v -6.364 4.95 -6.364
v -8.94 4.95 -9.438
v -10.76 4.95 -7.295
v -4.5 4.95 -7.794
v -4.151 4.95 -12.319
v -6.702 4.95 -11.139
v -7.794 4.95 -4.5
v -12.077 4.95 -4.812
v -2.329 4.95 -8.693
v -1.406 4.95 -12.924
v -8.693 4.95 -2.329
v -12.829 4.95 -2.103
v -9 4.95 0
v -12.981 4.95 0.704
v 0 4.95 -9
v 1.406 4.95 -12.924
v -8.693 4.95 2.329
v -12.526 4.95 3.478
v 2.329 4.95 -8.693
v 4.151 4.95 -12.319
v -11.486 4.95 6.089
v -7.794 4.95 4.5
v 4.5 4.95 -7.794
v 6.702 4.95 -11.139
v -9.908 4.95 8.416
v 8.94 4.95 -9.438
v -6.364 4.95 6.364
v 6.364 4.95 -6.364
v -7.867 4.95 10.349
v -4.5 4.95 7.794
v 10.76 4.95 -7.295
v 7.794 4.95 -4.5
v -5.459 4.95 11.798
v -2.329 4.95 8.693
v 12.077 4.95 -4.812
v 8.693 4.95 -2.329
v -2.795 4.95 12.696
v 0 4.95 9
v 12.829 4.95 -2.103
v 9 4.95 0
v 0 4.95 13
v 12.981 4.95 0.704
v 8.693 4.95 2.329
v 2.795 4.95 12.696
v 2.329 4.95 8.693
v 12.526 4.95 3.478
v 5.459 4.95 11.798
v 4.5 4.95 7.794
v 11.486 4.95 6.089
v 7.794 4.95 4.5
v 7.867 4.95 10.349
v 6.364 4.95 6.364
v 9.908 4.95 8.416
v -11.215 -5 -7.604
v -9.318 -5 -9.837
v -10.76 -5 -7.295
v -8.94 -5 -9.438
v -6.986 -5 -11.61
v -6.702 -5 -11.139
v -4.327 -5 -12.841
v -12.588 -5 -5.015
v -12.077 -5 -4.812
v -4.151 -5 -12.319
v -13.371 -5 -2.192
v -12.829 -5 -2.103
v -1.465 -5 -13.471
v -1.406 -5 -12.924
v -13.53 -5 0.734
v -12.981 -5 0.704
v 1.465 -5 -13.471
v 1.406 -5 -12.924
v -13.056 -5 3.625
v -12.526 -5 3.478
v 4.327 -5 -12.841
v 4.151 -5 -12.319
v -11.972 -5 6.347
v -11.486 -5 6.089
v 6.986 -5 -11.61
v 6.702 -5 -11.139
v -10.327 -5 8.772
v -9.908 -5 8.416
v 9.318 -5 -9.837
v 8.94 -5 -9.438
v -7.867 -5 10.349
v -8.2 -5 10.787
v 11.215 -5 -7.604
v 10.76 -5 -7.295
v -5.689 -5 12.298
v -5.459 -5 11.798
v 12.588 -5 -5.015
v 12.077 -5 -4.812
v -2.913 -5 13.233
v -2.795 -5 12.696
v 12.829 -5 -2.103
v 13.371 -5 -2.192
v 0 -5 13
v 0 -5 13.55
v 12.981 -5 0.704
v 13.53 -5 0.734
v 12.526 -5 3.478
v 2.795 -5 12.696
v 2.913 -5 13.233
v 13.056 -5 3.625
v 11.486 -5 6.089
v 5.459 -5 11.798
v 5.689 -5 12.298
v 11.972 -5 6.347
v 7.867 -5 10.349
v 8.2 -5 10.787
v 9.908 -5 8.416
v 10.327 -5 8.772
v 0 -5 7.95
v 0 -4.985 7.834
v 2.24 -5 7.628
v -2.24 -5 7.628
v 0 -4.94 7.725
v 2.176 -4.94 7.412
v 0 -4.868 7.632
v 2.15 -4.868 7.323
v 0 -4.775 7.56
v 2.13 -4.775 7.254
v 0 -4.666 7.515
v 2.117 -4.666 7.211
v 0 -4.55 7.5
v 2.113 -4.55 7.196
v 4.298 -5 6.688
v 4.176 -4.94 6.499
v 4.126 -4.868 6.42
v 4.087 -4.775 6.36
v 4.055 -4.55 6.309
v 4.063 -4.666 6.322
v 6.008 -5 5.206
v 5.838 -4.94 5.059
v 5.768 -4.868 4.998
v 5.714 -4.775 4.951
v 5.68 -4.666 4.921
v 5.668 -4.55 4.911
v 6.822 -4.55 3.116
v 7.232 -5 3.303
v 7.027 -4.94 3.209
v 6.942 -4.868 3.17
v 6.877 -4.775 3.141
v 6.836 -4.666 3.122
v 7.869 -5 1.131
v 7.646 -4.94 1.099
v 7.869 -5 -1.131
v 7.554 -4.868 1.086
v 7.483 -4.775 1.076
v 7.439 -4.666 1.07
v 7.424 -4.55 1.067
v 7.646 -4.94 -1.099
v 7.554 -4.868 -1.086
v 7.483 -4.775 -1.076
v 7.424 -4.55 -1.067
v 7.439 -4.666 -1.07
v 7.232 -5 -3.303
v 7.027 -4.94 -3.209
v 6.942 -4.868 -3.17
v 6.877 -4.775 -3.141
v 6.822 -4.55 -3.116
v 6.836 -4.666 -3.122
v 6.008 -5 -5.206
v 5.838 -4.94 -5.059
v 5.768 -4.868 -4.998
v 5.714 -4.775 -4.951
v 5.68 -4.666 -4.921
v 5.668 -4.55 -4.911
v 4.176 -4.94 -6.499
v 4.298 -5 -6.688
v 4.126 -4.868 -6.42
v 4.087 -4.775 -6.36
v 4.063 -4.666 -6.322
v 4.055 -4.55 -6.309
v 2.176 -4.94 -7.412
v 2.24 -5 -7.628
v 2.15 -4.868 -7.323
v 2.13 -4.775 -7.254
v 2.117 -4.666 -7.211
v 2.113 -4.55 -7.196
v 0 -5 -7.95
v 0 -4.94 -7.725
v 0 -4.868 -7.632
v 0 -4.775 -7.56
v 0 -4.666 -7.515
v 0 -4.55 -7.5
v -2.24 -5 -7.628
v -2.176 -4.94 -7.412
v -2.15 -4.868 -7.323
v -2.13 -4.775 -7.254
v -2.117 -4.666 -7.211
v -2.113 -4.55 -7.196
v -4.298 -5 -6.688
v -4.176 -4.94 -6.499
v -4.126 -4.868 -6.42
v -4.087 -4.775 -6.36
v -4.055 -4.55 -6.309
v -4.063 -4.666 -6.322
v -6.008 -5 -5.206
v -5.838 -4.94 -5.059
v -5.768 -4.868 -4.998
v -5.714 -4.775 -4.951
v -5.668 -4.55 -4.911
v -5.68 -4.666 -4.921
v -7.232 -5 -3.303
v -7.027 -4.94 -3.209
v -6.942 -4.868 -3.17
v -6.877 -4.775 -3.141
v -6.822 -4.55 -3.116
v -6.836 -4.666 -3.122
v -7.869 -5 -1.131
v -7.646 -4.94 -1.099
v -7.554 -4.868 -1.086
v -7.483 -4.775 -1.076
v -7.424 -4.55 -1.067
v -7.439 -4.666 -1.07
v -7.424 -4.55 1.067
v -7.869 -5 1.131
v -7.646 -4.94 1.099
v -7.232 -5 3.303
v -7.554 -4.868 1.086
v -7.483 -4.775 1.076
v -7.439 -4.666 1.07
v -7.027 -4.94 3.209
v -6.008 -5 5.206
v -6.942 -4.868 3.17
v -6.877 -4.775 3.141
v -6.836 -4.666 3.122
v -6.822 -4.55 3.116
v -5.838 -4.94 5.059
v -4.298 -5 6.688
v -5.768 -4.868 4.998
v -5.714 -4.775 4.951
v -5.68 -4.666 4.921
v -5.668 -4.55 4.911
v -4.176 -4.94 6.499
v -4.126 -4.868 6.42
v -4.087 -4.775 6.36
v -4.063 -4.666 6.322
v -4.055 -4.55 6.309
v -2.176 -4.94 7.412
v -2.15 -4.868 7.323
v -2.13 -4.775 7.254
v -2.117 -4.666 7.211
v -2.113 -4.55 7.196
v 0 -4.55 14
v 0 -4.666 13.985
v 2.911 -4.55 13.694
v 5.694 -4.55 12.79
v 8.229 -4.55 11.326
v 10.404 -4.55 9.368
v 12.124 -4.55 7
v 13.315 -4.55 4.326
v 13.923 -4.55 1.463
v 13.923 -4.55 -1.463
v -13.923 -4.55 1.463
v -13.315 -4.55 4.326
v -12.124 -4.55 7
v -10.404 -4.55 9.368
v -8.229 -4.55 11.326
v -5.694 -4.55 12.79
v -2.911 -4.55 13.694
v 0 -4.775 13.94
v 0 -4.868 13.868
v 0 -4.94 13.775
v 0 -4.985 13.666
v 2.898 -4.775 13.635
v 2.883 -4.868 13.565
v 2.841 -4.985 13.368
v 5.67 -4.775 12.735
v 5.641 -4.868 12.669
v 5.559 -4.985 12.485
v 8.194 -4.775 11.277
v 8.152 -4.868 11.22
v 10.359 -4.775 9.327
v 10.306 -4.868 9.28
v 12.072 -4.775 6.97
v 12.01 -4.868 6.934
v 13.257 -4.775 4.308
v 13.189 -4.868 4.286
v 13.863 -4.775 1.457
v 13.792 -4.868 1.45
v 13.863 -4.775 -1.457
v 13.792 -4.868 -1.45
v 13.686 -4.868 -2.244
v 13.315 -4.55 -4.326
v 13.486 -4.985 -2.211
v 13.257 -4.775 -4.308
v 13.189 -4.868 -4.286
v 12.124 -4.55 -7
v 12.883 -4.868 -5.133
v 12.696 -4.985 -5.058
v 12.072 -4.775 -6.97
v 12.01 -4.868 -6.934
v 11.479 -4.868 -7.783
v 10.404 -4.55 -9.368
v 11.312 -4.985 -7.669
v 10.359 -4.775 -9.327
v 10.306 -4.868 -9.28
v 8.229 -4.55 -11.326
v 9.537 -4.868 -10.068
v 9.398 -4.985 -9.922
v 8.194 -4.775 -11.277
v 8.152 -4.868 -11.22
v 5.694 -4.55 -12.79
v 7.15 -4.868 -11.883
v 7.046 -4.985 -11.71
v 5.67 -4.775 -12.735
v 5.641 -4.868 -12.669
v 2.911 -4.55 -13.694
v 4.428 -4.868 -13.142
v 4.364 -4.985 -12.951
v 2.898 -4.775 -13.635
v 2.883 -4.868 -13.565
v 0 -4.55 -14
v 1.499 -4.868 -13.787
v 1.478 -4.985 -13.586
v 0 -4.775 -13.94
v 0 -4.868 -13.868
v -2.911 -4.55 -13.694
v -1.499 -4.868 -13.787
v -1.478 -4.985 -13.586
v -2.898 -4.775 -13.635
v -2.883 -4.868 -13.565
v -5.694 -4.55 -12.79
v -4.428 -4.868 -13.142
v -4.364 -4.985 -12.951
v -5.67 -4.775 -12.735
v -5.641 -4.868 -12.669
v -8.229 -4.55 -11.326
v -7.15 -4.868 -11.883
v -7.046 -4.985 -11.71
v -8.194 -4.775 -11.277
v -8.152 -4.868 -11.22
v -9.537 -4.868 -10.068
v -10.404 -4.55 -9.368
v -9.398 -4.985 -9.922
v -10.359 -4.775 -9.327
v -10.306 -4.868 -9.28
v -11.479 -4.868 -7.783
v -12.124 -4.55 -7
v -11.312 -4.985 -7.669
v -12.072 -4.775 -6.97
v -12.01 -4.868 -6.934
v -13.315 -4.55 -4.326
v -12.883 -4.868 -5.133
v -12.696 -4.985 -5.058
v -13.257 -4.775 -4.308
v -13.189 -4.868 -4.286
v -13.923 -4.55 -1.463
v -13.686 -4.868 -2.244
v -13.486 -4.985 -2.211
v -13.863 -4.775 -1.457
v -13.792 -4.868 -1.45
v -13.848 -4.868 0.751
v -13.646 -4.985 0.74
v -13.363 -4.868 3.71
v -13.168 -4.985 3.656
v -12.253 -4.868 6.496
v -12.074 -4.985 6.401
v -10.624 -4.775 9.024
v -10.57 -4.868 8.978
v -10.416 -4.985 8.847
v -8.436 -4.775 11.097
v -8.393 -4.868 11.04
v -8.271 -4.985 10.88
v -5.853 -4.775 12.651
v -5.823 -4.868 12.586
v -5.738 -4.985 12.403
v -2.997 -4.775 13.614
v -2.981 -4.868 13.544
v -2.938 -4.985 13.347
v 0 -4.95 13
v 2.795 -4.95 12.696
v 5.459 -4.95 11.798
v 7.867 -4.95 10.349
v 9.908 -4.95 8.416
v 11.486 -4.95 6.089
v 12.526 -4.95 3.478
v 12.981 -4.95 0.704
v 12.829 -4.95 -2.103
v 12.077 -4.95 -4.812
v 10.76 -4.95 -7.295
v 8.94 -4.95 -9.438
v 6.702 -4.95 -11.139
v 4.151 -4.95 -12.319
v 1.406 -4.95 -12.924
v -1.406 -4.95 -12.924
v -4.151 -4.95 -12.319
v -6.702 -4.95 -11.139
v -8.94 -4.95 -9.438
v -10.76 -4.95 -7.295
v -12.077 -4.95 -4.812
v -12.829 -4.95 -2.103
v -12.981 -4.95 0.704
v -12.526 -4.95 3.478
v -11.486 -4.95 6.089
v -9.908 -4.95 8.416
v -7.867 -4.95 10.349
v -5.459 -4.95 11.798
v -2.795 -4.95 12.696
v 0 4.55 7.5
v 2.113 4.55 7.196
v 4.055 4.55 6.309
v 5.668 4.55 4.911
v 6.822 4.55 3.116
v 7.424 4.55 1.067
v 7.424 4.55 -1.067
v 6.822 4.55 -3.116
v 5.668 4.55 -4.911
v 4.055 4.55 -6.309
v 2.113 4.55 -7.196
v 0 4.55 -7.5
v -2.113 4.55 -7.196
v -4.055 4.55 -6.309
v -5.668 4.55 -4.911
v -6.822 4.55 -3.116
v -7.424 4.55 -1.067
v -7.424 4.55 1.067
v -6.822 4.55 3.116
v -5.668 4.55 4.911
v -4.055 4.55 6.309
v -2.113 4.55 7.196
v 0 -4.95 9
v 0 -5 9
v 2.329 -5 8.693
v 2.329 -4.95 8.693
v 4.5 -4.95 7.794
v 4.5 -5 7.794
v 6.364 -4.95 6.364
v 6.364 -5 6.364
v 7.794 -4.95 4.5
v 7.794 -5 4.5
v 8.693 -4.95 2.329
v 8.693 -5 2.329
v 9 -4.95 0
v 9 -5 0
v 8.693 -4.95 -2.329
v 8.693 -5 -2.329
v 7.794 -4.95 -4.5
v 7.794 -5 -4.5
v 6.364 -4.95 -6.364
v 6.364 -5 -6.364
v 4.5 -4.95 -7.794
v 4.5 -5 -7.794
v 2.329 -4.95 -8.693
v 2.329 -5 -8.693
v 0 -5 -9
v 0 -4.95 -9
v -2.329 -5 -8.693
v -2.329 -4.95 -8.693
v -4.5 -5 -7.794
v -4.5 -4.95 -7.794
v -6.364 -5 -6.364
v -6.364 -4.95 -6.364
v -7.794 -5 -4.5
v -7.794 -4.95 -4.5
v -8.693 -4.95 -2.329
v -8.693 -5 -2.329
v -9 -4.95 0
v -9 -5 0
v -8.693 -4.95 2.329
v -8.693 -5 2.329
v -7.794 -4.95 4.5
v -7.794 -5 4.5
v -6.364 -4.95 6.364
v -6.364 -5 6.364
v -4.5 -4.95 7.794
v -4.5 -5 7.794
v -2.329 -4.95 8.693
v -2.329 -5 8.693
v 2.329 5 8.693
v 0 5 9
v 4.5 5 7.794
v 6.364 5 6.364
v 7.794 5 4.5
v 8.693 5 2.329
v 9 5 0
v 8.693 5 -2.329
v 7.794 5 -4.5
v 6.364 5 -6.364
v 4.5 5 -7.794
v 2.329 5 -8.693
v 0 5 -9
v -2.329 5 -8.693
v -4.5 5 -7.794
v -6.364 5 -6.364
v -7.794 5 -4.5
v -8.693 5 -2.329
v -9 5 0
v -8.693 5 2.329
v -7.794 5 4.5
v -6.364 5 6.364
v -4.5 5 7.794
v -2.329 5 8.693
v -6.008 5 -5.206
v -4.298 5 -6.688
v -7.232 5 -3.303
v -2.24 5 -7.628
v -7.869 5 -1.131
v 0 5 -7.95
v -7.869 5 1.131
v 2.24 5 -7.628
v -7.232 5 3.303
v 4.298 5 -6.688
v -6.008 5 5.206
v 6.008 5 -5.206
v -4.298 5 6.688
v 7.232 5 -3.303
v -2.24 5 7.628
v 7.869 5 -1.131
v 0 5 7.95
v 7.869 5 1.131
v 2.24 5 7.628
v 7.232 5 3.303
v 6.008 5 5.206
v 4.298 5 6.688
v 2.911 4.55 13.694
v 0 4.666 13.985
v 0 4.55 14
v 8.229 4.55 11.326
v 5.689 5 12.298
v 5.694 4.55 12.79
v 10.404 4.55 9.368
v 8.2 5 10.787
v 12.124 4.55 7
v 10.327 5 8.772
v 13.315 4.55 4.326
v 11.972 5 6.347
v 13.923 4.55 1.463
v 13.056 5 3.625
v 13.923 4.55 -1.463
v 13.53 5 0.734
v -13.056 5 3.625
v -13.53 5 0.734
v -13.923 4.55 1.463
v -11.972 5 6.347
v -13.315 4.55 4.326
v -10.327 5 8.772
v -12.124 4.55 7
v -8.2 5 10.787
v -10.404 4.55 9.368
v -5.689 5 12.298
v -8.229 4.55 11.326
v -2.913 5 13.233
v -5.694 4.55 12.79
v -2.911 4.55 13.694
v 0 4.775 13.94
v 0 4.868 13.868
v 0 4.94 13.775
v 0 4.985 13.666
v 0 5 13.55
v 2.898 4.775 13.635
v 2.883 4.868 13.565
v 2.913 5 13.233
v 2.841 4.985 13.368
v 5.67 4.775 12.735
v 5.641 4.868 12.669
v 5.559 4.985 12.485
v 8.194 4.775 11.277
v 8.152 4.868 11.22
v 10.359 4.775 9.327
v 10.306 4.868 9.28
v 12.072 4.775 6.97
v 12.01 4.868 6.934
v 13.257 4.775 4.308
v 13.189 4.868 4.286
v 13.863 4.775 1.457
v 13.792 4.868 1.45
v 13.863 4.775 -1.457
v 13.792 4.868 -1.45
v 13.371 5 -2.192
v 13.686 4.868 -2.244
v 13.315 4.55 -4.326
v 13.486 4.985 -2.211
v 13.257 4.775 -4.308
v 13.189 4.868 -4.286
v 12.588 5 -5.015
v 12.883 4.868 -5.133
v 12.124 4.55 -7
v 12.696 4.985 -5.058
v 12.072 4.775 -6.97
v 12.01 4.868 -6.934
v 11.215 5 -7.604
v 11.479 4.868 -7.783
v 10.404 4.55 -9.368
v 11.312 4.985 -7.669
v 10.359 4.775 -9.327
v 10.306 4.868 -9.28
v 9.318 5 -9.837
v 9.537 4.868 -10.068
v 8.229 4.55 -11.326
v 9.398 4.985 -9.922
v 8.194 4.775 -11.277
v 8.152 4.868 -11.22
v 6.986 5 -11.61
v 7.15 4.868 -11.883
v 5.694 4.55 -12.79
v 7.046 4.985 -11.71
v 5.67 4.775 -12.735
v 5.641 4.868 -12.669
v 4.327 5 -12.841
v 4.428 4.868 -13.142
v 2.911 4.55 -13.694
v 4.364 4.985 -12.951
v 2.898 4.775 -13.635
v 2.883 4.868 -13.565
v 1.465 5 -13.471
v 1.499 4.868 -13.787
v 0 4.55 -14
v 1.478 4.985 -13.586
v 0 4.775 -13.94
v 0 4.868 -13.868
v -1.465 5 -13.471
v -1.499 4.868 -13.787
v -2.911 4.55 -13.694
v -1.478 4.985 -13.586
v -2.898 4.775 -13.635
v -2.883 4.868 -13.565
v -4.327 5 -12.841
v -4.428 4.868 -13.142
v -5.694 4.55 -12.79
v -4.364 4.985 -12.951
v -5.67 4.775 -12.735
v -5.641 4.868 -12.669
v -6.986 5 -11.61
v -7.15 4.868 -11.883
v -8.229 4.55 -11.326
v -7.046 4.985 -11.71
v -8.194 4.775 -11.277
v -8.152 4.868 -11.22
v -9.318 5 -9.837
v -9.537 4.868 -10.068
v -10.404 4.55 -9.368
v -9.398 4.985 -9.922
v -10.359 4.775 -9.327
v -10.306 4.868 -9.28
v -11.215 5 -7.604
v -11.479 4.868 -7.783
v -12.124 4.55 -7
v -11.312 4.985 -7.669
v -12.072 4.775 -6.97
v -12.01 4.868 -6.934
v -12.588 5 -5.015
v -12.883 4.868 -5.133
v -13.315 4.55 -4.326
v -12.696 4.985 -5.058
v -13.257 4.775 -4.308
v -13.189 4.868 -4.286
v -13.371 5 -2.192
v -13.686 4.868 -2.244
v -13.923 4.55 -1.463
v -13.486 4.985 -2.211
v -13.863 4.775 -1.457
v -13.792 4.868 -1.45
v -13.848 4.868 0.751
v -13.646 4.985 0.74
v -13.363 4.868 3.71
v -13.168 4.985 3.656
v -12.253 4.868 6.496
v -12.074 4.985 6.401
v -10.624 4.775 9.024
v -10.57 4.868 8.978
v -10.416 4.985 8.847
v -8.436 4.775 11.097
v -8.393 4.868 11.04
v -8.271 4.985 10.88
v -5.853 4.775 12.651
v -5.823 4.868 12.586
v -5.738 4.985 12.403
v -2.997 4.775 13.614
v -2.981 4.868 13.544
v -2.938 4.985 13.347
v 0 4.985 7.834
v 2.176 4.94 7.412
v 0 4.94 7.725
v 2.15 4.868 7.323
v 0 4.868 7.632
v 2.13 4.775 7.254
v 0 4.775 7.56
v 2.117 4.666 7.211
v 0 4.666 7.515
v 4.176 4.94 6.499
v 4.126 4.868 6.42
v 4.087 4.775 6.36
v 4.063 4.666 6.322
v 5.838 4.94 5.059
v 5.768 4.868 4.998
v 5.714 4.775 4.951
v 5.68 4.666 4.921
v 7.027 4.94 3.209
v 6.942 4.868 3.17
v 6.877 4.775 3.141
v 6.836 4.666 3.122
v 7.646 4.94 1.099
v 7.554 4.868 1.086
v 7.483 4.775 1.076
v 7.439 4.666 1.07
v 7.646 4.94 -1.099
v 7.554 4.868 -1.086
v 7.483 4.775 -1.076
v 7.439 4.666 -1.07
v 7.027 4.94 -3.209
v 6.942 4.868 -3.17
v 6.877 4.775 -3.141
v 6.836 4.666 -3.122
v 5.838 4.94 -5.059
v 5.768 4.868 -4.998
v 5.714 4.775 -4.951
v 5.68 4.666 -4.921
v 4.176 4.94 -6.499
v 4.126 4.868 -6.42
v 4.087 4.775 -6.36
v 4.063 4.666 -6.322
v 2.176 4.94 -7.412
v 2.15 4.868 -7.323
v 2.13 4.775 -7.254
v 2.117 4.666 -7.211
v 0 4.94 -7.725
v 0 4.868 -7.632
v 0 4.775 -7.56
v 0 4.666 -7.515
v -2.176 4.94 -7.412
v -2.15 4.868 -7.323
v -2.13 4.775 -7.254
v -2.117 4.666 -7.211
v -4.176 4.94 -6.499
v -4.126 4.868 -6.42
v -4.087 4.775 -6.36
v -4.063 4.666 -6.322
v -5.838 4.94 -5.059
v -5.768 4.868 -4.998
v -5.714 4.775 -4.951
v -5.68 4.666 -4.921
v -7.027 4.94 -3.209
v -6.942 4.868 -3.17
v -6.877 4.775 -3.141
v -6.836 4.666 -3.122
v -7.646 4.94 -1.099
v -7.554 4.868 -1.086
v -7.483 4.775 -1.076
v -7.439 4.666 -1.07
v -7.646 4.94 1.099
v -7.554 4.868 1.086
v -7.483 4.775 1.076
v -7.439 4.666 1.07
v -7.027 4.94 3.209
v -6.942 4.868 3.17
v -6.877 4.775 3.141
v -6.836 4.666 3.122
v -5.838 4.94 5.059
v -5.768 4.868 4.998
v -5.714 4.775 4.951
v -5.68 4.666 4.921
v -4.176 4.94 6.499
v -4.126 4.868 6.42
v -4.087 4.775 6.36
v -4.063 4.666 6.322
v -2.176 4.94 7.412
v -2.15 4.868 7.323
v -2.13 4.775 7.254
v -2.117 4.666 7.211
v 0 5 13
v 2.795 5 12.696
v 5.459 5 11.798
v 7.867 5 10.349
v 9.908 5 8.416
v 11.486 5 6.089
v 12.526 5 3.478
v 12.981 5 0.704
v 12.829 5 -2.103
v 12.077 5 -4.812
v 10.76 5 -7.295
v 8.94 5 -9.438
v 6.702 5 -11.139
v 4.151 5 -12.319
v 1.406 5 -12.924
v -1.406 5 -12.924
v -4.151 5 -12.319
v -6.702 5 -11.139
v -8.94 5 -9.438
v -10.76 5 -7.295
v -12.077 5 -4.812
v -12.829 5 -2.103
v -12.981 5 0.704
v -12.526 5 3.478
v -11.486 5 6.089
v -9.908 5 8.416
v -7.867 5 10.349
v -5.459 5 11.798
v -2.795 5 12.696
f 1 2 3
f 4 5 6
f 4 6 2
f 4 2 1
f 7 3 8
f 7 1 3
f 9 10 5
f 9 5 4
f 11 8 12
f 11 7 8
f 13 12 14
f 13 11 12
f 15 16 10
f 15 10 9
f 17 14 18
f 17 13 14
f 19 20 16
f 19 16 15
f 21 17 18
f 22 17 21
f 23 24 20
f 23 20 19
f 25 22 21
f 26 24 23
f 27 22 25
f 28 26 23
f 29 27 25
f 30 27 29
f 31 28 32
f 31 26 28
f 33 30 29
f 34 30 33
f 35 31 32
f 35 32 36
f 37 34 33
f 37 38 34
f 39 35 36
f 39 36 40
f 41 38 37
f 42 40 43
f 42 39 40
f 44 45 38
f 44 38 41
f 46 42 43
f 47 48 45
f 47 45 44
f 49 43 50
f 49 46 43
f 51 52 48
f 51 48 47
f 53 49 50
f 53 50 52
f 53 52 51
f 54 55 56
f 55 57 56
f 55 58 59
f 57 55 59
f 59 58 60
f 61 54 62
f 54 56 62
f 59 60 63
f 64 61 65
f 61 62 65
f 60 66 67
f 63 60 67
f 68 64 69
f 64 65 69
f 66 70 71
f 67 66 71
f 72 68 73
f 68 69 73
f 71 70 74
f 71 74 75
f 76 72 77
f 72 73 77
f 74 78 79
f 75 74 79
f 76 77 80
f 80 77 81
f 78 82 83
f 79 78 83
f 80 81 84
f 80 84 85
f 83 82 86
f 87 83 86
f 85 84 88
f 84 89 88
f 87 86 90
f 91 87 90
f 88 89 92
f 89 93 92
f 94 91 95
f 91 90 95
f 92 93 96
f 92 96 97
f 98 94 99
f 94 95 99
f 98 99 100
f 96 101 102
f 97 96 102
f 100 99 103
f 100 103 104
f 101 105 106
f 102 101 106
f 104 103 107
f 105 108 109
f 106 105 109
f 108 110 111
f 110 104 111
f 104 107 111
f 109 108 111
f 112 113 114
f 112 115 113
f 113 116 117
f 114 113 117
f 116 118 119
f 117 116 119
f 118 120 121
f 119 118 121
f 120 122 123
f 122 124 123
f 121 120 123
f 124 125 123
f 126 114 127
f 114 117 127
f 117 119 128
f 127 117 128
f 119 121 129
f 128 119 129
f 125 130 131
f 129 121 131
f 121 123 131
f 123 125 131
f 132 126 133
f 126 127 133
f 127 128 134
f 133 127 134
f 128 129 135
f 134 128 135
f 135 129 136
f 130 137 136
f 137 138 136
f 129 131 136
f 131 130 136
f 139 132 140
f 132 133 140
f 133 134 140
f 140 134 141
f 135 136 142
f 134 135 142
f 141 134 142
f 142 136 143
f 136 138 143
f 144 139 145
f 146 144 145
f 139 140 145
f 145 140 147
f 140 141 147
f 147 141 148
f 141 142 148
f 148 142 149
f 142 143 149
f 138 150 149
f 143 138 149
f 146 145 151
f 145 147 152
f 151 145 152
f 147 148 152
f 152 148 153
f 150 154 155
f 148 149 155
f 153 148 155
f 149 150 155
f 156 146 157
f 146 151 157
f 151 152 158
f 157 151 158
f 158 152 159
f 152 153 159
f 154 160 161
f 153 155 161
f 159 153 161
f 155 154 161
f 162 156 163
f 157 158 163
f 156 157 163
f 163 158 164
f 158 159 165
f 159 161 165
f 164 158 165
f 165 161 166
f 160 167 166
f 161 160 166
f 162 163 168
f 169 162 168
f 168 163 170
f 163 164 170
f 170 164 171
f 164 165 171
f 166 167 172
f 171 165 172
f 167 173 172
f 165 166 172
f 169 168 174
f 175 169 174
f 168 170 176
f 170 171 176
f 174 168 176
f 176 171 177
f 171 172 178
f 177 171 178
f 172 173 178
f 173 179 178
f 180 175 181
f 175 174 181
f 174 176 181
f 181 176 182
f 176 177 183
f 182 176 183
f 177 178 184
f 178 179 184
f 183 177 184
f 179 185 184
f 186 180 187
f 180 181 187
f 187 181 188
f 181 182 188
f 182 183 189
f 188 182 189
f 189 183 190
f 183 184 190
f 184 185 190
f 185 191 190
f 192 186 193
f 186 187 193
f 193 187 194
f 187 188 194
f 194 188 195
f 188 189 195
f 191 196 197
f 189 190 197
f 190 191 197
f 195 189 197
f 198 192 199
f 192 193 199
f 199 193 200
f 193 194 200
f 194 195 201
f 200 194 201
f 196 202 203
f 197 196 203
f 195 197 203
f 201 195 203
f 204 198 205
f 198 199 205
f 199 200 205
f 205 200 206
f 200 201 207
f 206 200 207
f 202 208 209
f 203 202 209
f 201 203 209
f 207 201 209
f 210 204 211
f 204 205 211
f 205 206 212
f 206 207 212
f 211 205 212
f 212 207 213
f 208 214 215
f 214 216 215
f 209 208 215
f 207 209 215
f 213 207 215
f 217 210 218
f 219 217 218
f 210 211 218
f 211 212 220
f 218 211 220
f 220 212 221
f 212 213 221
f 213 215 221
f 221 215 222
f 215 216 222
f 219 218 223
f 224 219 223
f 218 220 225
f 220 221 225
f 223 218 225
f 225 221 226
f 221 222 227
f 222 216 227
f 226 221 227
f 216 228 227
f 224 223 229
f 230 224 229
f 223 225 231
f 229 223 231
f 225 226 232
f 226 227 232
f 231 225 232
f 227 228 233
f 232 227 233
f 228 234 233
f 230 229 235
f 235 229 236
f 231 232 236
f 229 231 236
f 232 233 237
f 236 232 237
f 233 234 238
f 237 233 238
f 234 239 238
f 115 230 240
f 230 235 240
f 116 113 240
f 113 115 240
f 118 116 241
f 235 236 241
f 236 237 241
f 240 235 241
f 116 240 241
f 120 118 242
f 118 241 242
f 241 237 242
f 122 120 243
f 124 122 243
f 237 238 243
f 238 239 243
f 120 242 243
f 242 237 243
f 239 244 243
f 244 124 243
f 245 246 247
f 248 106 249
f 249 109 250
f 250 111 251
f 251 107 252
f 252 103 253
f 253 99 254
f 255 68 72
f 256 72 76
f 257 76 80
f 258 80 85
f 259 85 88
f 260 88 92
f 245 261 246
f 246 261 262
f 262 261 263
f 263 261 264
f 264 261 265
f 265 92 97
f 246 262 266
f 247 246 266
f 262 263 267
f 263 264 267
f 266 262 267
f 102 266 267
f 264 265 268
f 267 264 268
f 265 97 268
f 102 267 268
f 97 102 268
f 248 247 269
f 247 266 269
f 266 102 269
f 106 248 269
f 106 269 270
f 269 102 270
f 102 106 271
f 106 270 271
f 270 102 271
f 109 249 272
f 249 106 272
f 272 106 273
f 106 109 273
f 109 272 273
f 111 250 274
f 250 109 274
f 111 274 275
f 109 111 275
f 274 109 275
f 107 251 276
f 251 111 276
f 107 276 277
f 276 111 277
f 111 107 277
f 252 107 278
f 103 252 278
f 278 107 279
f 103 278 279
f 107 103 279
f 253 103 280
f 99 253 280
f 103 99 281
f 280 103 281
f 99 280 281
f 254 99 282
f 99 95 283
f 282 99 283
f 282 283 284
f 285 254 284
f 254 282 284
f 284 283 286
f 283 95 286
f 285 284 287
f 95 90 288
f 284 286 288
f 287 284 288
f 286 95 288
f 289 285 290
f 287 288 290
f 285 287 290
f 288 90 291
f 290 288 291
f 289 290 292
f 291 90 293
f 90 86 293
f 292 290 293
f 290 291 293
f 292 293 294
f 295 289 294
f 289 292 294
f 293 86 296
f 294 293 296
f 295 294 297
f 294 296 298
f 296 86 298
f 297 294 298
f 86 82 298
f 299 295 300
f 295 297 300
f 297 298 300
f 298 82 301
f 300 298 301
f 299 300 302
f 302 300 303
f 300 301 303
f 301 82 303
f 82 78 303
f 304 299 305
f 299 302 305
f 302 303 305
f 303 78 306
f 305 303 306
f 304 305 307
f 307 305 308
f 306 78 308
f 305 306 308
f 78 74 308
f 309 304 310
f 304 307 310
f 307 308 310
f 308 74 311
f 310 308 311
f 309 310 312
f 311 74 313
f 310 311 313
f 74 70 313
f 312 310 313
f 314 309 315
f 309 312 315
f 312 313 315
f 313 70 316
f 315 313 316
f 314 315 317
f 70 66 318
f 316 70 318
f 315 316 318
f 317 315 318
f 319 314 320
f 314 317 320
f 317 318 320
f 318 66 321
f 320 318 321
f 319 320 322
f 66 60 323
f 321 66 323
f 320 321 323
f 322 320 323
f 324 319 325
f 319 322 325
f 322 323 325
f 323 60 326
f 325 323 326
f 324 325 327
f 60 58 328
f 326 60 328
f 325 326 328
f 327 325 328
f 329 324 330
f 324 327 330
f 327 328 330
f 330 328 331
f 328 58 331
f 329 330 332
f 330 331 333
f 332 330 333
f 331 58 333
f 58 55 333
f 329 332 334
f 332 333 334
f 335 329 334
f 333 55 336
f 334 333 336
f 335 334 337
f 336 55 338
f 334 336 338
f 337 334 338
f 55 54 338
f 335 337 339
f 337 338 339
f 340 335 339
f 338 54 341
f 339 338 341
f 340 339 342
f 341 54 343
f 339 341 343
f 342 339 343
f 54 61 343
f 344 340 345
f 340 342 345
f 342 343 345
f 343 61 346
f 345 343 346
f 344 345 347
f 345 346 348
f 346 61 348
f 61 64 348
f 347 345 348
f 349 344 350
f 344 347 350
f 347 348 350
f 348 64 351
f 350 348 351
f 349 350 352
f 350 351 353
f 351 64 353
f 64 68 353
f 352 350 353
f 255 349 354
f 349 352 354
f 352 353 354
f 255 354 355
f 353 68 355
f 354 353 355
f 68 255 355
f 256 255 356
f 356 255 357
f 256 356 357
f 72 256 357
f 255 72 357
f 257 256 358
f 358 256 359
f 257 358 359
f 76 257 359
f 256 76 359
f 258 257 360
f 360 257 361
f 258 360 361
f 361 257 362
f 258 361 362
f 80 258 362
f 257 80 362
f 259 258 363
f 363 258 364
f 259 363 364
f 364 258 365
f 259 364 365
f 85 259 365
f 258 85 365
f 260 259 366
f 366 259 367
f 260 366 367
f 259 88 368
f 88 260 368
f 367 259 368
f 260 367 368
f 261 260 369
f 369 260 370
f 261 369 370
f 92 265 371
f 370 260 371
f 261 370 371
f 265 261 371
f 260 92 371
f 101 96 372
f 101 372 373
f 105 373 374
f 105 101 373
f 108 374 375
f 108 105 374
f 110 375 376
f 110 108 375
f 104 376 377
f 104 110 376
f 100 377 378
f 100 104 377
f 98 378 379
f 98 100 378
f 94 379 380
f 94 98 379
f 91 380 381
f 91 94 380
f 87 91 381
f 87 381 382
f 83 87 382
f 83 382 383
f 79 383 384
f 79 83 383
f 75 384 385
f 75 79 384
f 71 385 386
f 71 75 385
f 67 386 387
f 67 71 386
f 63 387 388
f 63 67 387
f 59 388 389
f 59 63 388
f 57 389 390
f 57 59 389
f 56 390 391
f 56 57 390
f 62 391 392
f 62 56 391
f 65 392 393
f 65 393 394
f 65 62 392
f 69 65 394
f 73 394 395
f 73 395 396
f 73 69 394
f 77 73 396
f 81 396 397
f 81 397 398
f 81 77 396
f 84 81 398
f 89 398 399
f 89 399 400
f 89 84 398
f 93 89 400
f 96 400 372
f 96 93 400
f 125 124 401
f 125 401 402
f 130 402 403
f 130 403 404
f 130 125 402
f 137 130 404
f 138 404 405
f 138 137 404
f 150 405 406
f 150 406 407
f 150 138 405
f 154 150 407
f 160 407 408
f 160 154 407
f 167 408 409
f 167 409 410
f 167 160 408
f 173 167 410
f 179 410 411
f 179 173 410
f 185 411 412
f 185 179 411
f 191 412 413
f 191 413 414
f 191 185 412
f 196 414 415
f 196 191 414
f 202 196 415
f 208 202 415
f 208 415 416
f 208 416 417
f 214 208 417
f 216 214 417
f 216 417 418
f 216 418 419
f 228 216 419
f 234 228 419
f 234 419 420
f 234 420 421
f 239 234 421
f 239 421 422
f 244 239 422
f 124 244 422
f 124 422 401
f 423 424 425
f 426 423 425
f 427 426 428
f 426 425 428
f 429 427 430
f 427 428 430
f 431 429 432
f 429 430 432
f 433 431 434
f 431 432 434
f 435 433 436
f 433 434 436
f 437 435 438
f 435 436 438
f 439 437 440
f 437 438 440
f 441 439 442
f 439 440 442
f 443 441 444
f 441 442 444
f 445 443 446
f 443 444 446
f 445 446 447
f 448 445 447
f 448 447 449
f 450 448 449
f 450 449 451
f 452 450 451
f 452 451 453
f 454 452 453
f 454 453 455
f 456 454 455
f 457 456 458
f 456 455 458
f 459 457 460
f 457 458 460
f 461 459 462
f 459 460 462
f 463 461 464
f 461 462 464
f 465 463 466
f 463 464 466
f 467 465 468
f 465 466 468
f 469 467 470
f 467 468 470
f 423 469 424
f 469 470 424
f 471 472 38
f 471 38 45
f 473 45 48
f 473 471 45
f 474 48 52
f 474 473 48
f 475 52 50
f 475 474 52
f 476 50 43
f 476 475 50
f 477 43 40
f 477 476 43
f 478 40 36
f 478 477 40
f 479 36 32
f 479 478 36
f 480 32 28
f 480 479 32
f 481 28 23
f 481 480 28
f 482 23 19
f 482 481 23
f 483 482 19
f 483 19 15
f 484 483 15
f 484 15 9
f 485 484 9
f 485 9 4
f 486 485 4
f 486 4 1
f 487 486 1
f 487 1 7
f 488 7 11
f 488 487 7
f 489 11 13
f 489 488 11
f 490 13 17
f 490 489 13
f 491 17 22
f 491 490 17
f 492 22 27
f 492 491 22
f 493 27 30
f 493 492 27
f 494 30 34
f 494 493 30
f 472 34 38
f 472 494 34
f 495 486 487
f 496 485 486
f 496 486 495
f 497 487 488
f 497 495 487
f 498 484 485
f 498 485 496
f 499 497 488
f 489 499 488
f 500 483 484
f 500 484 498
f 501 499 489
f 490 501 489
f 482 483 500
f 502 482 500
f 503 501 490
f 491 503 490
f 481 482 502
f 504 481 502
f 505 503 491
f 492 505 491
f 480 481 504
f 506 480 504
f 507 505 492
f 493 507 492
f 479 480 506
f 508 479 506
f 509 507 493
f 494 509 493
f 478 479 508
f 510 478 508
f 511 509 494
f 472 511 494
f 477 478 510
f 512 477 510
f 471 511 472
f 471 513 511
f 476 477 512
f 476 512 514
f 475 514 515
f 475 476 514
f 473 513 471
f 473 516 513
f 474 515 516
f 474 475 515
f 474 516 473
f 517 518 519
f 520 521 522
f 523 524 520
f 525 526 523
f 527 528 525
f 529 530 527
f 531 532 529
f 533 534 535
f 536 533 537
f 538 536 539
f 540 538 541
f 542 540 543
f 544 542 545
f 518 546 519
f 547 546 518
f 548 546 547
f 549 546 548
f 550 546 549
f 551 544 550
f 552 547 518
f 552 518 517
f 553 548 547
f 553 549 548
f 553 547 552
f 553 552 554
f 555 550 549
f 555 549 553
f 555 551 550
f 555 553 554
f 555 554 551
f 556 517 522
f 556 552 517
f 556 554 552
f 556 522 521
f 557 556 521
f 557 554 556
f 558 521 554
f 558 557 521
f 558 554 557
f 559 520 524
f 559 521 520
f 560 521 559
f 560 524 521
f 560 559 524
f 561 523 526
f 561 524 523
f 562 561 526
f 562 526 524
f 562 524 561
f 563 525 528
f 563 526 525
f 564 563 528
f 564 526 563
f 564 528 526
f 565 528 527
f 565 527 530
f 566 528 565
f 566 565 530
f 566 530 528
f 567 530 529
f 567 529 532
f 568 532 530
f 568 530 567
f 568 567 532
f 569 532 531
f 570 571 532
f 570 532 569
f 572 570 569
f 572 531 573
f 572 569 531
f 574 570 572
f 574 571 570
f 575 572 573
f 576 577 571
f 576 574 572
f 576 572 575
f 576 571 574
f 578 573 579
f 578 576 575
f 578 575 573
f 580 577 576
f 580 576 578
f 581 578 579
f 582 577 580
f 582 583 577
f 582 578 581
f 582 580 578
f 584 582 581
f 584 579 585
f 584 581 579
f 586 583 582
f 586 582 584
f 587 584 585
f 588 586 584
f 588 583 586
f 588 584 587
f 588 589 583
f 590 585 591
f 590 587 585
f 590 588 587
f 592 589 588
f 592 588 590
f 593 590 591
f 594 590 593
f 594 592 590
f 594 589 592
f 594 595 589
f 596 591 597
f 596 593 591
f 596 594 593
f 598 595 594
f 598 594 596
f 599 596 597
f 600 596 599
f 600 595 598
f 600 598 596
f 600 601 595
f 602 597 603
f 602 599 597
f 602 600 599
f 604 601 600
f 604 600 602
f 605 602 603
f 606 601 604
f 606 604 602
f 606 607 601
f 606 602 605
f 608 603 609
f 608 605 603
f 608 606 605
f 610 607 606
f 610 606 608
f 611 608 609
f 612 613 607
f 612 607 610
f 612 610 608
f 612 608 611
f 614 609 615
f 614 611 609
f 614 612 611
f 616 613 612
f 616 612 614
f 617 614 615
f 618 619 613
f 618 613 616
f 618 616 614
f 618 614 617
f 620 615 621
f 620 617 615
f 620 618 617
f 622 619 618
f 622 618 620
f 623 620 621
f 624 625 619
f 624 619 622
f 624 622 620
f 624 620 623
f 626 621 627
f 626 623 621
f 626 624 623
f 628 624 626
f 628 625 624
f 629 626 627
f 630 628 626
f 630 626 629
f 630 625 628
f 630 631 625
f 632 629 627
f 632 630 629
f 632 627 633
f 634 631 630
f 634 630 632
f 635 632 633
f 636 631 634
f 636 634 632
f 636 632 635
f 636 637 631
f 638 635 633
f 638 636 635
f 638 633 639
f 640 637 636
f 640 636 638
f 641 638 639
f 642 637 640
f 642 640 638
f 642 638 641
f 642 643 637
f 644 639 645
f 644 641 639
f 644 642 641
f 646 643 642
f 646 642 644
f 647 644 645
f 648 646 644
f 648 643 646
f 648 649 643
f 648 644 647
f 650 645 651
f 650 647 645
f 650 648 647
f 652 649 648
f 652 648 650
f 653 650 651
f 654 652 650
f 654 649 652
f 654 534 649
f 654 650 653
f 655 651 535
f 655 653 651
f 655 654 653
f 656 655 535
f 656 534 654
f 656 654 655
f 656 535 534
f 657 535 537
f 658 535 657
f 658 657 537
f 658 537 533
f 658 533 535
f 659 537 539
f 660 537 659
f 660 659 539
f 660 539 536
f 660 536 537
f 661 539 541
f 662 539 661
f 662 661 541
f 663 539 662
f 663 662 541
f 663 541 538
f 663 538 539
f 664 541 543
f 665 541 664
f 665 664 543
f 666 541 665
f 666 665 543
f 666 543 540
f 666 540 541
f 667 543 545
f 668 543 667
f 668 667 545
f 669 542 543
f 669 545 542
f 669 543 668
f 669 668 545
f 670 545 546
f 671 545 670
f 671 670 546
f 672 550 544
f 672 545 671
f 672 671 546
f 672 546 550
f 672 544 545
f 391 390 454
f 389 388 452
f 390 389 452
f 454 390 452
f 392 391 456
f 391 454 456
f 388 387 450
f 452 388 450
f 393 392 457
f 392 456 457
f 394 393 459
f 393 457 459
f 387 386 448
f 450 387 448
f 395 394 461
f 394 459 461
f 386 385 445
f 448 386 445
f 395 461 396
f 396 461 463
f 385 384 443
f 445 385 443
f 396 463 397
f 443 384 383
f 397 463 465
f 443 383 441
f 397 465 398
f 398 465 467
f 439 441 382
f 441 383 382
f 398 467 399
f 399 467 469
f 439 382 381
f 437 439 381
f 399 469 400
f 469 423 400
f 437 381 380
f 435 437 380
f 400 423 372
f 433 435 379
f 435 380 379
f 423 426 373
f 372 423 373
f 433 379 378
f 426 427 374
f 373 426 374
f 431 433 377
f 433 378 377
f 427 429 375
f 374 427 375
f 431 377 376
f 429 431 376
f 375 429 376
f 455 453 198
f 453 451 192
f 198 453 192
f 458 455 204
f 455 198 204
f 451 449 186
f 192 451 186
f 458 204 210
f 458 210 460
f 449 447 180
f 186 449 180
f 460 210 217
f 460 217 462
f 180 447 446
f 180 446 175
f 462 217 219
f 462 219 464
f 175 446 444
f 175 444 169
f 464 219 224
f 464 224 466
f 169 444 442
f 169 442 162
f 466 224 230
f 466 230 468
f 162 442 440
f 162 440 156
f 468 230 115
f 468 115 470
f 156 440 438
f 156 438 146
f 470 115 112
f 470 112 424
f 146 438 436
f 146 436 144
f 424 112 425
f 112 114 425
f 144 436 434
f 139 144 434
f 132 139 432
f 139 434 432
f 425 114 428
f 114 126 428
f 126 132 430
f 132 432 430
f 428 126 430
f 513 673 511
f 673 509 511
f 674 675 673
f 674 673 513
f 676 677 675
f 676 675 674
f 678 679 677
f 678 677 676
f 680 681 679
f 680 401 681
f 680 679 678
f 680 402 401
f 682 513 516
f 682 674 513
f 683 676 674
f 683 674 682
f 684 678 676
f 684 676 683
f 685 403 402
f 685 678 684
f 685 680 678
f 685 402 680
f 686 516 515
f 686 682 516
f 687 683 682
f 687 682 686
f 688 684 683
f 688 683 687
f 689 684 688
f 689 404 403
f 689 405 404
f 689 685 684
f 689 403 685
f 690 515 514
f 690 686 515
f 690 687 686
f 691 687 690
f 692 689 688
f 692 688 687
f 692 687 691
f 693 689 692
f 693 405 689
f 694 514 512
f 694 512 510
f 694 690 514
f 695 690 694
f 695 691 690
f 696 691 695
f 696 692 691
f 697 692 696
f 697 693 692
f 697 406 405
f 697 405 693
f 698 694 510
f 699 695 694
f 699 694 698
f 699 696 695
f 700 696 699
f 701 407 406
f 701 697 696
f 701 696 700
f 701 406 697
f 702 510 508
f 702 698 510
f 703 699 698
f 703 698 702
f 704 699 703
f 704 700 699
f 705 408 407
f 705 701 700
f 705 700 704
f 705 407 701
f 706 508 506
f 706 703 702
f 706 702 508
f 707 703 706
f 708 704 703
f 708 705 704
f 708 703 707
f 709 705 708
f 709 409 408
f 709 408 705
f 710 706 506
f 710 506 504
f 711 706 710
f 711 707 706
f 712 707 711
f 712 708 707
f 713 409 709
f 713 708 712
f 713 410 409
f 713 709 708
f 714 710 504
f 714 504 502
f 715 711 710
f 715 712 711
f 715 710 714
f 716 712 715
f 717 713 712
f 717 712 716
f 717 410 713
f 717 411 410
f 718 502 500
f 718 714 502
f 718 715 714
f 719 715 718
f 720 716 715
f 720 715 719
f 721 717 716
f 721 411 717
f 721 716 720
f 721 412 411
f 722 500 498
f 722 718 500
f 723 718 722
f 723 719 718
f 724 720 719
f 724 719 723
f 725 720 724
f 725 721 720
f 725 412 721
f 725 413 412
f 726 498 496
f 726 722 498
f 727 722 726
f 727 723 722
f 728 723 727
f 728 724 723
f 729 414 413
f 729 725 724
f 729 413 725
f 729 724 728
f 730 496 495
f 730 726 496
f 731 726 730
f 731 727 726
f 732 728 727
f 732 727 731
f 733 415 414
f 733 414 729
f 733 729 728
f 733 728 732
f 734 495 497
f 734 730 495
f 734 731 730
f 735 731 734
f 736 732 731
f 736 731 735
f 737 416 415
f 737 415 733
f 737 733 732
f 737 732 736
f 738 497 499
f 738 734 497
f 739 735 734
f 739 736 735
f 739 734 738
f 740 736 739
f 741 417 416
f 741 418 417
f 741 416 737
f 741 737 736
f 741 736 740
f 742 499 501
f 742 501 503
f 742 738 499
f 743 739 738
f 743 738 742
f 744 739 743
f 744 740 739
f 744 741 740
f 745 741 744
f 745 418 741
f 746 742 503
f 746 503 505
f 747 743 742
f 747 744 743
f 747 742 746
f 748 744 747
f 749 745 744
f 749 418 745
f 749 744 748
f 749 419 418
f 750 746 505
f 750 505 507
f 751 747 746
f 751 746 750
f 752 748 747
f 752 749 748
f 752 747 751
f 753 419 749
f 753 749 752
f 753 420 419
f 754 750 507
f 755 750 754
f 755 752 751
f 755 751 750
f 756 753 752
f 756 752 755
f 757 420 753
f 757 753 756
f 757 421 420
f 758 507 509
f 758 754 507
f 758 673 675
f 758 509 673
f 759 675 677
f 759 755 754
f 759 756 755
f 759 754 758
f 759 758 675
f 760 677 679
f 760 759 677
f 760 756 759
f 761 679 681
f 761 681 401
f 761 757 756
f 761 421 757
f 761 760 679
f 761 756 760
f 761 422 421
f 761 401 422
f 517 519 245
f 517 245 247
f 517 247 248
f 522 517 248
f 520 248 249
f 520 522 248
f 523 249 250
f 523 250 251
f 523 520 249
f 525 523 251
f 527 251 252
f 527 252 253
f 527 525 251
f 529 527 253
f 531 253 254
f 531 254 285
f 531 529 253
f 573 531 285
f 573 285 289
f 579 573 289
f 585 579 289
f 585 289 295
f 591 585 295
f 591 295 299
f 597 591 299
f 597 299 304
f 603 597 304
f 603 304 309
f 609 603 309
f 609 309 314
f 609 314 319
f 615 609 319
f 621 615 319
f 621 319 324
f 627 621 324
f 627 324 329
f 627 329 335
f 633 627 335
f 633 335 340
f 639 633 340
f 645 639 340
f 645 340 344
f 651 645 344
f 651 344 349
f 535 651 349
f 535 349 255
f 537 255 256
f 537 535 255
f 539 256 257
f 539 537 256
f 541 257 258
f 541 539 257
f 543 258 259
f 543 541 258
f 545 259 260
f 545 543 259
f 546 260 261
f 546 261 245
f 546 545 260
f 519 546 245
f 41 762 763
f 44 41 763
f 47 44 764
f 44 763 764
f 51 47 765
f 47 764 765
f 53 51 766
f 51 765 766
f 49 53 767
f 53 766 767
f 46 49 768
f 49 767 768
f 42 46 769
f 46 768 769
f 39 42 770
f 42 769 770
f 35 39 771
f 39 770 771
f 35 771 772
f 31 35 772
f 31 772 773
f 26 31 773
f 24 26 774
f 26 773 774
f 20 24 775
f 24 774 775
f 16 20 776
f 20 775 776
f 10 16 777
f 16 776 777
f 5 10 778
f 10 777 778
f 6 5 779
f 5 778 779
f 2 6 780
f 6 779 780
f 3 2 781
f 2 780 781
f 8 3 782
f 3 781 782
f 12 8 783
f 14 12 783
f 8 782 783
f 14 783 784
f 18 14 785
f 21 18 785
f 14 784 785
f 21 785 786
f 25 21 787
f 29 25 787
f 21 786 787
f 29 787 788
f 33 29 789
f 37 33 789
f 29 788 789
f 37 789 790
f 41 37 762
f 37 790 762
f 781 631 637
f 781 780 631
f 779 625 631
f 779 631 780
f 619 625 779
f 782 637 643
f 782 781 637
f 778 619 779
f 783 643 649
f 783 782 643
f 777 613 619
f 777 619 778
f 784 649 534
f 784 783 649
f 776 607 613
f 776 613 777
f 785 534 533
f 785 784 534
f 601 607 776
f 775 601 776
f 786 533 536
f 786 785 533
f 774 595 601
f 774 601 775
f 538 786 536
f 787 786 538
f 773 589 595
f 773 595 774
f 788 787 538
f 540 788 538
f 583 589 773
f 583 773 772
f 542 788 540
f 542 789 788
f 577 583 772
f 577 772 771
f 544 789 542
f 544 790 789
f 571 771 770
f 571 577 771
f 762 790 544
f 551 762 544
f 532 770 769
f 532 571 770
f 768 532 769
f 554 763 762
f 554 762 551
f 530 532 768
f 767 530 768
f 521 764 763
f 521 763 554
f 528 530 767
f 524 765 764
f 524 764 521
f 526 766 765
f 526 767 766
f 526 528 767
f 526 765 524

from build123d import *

# Parameters (mm, degrees)
SKETCH1_R           = 14
SKETCH1_R_2         = 7.5
BOSS_EXTRUDE1_DEPTH = 5
SKETCH2_R           = 13
SKETCH2_R_2         = 9
CUT_EXTRUDE1_DEPTH  = 0.05
FILLET1_R           = 0.45


with BuildPart() as part:
    # Sketch1 → Boss-Extrude1 (new, symmetric)
    with BuildSketch(Plane(origin=(0, 0, 0), x_dir=(1, 0, 0), z_dir=(0, 1, 0))):
        Circle(SKETCH1_R)
        Circle(SKETCH1_R_2, mode=Mode.SUBTRACT)
    extrude(amount=BOSS_EXTRUDE1_DEPTH, both=True)

    # Sketch2 → Cut-Extrude1 (cut)
    with BuildSketch(Plane(origin=(0, 5, 0), x_dir=(1, 0, 0), z_dir=(0, 1, 0))):
        Circle(SKETCH2_R)
        Circle(SKETCH2_R_2, mode=Mode.SUBTRACT)
    cut_extrude1 = extrude(amount=-CUT_EXTRUDE1_DEPTH, mode=Mode.SUBTRACT)

    # Mirror1: Cut-Extrude1 across plane
    add(cut_extrude1.mirror(Plane.ZX), mode=Mode.SUBTRACT)

    # Fillet1
    fillet1_edges = [part.edges().sort_by_distance(p)[0] for p in [
        (-7.5, -5, 0),
        (-7.5, 5, 0),
        (-14, -5, 0),
        (-14, 5, 0),
    ]]
    fillet(fillet1_edges, radius=FILLET1_R)


solid = part.part
